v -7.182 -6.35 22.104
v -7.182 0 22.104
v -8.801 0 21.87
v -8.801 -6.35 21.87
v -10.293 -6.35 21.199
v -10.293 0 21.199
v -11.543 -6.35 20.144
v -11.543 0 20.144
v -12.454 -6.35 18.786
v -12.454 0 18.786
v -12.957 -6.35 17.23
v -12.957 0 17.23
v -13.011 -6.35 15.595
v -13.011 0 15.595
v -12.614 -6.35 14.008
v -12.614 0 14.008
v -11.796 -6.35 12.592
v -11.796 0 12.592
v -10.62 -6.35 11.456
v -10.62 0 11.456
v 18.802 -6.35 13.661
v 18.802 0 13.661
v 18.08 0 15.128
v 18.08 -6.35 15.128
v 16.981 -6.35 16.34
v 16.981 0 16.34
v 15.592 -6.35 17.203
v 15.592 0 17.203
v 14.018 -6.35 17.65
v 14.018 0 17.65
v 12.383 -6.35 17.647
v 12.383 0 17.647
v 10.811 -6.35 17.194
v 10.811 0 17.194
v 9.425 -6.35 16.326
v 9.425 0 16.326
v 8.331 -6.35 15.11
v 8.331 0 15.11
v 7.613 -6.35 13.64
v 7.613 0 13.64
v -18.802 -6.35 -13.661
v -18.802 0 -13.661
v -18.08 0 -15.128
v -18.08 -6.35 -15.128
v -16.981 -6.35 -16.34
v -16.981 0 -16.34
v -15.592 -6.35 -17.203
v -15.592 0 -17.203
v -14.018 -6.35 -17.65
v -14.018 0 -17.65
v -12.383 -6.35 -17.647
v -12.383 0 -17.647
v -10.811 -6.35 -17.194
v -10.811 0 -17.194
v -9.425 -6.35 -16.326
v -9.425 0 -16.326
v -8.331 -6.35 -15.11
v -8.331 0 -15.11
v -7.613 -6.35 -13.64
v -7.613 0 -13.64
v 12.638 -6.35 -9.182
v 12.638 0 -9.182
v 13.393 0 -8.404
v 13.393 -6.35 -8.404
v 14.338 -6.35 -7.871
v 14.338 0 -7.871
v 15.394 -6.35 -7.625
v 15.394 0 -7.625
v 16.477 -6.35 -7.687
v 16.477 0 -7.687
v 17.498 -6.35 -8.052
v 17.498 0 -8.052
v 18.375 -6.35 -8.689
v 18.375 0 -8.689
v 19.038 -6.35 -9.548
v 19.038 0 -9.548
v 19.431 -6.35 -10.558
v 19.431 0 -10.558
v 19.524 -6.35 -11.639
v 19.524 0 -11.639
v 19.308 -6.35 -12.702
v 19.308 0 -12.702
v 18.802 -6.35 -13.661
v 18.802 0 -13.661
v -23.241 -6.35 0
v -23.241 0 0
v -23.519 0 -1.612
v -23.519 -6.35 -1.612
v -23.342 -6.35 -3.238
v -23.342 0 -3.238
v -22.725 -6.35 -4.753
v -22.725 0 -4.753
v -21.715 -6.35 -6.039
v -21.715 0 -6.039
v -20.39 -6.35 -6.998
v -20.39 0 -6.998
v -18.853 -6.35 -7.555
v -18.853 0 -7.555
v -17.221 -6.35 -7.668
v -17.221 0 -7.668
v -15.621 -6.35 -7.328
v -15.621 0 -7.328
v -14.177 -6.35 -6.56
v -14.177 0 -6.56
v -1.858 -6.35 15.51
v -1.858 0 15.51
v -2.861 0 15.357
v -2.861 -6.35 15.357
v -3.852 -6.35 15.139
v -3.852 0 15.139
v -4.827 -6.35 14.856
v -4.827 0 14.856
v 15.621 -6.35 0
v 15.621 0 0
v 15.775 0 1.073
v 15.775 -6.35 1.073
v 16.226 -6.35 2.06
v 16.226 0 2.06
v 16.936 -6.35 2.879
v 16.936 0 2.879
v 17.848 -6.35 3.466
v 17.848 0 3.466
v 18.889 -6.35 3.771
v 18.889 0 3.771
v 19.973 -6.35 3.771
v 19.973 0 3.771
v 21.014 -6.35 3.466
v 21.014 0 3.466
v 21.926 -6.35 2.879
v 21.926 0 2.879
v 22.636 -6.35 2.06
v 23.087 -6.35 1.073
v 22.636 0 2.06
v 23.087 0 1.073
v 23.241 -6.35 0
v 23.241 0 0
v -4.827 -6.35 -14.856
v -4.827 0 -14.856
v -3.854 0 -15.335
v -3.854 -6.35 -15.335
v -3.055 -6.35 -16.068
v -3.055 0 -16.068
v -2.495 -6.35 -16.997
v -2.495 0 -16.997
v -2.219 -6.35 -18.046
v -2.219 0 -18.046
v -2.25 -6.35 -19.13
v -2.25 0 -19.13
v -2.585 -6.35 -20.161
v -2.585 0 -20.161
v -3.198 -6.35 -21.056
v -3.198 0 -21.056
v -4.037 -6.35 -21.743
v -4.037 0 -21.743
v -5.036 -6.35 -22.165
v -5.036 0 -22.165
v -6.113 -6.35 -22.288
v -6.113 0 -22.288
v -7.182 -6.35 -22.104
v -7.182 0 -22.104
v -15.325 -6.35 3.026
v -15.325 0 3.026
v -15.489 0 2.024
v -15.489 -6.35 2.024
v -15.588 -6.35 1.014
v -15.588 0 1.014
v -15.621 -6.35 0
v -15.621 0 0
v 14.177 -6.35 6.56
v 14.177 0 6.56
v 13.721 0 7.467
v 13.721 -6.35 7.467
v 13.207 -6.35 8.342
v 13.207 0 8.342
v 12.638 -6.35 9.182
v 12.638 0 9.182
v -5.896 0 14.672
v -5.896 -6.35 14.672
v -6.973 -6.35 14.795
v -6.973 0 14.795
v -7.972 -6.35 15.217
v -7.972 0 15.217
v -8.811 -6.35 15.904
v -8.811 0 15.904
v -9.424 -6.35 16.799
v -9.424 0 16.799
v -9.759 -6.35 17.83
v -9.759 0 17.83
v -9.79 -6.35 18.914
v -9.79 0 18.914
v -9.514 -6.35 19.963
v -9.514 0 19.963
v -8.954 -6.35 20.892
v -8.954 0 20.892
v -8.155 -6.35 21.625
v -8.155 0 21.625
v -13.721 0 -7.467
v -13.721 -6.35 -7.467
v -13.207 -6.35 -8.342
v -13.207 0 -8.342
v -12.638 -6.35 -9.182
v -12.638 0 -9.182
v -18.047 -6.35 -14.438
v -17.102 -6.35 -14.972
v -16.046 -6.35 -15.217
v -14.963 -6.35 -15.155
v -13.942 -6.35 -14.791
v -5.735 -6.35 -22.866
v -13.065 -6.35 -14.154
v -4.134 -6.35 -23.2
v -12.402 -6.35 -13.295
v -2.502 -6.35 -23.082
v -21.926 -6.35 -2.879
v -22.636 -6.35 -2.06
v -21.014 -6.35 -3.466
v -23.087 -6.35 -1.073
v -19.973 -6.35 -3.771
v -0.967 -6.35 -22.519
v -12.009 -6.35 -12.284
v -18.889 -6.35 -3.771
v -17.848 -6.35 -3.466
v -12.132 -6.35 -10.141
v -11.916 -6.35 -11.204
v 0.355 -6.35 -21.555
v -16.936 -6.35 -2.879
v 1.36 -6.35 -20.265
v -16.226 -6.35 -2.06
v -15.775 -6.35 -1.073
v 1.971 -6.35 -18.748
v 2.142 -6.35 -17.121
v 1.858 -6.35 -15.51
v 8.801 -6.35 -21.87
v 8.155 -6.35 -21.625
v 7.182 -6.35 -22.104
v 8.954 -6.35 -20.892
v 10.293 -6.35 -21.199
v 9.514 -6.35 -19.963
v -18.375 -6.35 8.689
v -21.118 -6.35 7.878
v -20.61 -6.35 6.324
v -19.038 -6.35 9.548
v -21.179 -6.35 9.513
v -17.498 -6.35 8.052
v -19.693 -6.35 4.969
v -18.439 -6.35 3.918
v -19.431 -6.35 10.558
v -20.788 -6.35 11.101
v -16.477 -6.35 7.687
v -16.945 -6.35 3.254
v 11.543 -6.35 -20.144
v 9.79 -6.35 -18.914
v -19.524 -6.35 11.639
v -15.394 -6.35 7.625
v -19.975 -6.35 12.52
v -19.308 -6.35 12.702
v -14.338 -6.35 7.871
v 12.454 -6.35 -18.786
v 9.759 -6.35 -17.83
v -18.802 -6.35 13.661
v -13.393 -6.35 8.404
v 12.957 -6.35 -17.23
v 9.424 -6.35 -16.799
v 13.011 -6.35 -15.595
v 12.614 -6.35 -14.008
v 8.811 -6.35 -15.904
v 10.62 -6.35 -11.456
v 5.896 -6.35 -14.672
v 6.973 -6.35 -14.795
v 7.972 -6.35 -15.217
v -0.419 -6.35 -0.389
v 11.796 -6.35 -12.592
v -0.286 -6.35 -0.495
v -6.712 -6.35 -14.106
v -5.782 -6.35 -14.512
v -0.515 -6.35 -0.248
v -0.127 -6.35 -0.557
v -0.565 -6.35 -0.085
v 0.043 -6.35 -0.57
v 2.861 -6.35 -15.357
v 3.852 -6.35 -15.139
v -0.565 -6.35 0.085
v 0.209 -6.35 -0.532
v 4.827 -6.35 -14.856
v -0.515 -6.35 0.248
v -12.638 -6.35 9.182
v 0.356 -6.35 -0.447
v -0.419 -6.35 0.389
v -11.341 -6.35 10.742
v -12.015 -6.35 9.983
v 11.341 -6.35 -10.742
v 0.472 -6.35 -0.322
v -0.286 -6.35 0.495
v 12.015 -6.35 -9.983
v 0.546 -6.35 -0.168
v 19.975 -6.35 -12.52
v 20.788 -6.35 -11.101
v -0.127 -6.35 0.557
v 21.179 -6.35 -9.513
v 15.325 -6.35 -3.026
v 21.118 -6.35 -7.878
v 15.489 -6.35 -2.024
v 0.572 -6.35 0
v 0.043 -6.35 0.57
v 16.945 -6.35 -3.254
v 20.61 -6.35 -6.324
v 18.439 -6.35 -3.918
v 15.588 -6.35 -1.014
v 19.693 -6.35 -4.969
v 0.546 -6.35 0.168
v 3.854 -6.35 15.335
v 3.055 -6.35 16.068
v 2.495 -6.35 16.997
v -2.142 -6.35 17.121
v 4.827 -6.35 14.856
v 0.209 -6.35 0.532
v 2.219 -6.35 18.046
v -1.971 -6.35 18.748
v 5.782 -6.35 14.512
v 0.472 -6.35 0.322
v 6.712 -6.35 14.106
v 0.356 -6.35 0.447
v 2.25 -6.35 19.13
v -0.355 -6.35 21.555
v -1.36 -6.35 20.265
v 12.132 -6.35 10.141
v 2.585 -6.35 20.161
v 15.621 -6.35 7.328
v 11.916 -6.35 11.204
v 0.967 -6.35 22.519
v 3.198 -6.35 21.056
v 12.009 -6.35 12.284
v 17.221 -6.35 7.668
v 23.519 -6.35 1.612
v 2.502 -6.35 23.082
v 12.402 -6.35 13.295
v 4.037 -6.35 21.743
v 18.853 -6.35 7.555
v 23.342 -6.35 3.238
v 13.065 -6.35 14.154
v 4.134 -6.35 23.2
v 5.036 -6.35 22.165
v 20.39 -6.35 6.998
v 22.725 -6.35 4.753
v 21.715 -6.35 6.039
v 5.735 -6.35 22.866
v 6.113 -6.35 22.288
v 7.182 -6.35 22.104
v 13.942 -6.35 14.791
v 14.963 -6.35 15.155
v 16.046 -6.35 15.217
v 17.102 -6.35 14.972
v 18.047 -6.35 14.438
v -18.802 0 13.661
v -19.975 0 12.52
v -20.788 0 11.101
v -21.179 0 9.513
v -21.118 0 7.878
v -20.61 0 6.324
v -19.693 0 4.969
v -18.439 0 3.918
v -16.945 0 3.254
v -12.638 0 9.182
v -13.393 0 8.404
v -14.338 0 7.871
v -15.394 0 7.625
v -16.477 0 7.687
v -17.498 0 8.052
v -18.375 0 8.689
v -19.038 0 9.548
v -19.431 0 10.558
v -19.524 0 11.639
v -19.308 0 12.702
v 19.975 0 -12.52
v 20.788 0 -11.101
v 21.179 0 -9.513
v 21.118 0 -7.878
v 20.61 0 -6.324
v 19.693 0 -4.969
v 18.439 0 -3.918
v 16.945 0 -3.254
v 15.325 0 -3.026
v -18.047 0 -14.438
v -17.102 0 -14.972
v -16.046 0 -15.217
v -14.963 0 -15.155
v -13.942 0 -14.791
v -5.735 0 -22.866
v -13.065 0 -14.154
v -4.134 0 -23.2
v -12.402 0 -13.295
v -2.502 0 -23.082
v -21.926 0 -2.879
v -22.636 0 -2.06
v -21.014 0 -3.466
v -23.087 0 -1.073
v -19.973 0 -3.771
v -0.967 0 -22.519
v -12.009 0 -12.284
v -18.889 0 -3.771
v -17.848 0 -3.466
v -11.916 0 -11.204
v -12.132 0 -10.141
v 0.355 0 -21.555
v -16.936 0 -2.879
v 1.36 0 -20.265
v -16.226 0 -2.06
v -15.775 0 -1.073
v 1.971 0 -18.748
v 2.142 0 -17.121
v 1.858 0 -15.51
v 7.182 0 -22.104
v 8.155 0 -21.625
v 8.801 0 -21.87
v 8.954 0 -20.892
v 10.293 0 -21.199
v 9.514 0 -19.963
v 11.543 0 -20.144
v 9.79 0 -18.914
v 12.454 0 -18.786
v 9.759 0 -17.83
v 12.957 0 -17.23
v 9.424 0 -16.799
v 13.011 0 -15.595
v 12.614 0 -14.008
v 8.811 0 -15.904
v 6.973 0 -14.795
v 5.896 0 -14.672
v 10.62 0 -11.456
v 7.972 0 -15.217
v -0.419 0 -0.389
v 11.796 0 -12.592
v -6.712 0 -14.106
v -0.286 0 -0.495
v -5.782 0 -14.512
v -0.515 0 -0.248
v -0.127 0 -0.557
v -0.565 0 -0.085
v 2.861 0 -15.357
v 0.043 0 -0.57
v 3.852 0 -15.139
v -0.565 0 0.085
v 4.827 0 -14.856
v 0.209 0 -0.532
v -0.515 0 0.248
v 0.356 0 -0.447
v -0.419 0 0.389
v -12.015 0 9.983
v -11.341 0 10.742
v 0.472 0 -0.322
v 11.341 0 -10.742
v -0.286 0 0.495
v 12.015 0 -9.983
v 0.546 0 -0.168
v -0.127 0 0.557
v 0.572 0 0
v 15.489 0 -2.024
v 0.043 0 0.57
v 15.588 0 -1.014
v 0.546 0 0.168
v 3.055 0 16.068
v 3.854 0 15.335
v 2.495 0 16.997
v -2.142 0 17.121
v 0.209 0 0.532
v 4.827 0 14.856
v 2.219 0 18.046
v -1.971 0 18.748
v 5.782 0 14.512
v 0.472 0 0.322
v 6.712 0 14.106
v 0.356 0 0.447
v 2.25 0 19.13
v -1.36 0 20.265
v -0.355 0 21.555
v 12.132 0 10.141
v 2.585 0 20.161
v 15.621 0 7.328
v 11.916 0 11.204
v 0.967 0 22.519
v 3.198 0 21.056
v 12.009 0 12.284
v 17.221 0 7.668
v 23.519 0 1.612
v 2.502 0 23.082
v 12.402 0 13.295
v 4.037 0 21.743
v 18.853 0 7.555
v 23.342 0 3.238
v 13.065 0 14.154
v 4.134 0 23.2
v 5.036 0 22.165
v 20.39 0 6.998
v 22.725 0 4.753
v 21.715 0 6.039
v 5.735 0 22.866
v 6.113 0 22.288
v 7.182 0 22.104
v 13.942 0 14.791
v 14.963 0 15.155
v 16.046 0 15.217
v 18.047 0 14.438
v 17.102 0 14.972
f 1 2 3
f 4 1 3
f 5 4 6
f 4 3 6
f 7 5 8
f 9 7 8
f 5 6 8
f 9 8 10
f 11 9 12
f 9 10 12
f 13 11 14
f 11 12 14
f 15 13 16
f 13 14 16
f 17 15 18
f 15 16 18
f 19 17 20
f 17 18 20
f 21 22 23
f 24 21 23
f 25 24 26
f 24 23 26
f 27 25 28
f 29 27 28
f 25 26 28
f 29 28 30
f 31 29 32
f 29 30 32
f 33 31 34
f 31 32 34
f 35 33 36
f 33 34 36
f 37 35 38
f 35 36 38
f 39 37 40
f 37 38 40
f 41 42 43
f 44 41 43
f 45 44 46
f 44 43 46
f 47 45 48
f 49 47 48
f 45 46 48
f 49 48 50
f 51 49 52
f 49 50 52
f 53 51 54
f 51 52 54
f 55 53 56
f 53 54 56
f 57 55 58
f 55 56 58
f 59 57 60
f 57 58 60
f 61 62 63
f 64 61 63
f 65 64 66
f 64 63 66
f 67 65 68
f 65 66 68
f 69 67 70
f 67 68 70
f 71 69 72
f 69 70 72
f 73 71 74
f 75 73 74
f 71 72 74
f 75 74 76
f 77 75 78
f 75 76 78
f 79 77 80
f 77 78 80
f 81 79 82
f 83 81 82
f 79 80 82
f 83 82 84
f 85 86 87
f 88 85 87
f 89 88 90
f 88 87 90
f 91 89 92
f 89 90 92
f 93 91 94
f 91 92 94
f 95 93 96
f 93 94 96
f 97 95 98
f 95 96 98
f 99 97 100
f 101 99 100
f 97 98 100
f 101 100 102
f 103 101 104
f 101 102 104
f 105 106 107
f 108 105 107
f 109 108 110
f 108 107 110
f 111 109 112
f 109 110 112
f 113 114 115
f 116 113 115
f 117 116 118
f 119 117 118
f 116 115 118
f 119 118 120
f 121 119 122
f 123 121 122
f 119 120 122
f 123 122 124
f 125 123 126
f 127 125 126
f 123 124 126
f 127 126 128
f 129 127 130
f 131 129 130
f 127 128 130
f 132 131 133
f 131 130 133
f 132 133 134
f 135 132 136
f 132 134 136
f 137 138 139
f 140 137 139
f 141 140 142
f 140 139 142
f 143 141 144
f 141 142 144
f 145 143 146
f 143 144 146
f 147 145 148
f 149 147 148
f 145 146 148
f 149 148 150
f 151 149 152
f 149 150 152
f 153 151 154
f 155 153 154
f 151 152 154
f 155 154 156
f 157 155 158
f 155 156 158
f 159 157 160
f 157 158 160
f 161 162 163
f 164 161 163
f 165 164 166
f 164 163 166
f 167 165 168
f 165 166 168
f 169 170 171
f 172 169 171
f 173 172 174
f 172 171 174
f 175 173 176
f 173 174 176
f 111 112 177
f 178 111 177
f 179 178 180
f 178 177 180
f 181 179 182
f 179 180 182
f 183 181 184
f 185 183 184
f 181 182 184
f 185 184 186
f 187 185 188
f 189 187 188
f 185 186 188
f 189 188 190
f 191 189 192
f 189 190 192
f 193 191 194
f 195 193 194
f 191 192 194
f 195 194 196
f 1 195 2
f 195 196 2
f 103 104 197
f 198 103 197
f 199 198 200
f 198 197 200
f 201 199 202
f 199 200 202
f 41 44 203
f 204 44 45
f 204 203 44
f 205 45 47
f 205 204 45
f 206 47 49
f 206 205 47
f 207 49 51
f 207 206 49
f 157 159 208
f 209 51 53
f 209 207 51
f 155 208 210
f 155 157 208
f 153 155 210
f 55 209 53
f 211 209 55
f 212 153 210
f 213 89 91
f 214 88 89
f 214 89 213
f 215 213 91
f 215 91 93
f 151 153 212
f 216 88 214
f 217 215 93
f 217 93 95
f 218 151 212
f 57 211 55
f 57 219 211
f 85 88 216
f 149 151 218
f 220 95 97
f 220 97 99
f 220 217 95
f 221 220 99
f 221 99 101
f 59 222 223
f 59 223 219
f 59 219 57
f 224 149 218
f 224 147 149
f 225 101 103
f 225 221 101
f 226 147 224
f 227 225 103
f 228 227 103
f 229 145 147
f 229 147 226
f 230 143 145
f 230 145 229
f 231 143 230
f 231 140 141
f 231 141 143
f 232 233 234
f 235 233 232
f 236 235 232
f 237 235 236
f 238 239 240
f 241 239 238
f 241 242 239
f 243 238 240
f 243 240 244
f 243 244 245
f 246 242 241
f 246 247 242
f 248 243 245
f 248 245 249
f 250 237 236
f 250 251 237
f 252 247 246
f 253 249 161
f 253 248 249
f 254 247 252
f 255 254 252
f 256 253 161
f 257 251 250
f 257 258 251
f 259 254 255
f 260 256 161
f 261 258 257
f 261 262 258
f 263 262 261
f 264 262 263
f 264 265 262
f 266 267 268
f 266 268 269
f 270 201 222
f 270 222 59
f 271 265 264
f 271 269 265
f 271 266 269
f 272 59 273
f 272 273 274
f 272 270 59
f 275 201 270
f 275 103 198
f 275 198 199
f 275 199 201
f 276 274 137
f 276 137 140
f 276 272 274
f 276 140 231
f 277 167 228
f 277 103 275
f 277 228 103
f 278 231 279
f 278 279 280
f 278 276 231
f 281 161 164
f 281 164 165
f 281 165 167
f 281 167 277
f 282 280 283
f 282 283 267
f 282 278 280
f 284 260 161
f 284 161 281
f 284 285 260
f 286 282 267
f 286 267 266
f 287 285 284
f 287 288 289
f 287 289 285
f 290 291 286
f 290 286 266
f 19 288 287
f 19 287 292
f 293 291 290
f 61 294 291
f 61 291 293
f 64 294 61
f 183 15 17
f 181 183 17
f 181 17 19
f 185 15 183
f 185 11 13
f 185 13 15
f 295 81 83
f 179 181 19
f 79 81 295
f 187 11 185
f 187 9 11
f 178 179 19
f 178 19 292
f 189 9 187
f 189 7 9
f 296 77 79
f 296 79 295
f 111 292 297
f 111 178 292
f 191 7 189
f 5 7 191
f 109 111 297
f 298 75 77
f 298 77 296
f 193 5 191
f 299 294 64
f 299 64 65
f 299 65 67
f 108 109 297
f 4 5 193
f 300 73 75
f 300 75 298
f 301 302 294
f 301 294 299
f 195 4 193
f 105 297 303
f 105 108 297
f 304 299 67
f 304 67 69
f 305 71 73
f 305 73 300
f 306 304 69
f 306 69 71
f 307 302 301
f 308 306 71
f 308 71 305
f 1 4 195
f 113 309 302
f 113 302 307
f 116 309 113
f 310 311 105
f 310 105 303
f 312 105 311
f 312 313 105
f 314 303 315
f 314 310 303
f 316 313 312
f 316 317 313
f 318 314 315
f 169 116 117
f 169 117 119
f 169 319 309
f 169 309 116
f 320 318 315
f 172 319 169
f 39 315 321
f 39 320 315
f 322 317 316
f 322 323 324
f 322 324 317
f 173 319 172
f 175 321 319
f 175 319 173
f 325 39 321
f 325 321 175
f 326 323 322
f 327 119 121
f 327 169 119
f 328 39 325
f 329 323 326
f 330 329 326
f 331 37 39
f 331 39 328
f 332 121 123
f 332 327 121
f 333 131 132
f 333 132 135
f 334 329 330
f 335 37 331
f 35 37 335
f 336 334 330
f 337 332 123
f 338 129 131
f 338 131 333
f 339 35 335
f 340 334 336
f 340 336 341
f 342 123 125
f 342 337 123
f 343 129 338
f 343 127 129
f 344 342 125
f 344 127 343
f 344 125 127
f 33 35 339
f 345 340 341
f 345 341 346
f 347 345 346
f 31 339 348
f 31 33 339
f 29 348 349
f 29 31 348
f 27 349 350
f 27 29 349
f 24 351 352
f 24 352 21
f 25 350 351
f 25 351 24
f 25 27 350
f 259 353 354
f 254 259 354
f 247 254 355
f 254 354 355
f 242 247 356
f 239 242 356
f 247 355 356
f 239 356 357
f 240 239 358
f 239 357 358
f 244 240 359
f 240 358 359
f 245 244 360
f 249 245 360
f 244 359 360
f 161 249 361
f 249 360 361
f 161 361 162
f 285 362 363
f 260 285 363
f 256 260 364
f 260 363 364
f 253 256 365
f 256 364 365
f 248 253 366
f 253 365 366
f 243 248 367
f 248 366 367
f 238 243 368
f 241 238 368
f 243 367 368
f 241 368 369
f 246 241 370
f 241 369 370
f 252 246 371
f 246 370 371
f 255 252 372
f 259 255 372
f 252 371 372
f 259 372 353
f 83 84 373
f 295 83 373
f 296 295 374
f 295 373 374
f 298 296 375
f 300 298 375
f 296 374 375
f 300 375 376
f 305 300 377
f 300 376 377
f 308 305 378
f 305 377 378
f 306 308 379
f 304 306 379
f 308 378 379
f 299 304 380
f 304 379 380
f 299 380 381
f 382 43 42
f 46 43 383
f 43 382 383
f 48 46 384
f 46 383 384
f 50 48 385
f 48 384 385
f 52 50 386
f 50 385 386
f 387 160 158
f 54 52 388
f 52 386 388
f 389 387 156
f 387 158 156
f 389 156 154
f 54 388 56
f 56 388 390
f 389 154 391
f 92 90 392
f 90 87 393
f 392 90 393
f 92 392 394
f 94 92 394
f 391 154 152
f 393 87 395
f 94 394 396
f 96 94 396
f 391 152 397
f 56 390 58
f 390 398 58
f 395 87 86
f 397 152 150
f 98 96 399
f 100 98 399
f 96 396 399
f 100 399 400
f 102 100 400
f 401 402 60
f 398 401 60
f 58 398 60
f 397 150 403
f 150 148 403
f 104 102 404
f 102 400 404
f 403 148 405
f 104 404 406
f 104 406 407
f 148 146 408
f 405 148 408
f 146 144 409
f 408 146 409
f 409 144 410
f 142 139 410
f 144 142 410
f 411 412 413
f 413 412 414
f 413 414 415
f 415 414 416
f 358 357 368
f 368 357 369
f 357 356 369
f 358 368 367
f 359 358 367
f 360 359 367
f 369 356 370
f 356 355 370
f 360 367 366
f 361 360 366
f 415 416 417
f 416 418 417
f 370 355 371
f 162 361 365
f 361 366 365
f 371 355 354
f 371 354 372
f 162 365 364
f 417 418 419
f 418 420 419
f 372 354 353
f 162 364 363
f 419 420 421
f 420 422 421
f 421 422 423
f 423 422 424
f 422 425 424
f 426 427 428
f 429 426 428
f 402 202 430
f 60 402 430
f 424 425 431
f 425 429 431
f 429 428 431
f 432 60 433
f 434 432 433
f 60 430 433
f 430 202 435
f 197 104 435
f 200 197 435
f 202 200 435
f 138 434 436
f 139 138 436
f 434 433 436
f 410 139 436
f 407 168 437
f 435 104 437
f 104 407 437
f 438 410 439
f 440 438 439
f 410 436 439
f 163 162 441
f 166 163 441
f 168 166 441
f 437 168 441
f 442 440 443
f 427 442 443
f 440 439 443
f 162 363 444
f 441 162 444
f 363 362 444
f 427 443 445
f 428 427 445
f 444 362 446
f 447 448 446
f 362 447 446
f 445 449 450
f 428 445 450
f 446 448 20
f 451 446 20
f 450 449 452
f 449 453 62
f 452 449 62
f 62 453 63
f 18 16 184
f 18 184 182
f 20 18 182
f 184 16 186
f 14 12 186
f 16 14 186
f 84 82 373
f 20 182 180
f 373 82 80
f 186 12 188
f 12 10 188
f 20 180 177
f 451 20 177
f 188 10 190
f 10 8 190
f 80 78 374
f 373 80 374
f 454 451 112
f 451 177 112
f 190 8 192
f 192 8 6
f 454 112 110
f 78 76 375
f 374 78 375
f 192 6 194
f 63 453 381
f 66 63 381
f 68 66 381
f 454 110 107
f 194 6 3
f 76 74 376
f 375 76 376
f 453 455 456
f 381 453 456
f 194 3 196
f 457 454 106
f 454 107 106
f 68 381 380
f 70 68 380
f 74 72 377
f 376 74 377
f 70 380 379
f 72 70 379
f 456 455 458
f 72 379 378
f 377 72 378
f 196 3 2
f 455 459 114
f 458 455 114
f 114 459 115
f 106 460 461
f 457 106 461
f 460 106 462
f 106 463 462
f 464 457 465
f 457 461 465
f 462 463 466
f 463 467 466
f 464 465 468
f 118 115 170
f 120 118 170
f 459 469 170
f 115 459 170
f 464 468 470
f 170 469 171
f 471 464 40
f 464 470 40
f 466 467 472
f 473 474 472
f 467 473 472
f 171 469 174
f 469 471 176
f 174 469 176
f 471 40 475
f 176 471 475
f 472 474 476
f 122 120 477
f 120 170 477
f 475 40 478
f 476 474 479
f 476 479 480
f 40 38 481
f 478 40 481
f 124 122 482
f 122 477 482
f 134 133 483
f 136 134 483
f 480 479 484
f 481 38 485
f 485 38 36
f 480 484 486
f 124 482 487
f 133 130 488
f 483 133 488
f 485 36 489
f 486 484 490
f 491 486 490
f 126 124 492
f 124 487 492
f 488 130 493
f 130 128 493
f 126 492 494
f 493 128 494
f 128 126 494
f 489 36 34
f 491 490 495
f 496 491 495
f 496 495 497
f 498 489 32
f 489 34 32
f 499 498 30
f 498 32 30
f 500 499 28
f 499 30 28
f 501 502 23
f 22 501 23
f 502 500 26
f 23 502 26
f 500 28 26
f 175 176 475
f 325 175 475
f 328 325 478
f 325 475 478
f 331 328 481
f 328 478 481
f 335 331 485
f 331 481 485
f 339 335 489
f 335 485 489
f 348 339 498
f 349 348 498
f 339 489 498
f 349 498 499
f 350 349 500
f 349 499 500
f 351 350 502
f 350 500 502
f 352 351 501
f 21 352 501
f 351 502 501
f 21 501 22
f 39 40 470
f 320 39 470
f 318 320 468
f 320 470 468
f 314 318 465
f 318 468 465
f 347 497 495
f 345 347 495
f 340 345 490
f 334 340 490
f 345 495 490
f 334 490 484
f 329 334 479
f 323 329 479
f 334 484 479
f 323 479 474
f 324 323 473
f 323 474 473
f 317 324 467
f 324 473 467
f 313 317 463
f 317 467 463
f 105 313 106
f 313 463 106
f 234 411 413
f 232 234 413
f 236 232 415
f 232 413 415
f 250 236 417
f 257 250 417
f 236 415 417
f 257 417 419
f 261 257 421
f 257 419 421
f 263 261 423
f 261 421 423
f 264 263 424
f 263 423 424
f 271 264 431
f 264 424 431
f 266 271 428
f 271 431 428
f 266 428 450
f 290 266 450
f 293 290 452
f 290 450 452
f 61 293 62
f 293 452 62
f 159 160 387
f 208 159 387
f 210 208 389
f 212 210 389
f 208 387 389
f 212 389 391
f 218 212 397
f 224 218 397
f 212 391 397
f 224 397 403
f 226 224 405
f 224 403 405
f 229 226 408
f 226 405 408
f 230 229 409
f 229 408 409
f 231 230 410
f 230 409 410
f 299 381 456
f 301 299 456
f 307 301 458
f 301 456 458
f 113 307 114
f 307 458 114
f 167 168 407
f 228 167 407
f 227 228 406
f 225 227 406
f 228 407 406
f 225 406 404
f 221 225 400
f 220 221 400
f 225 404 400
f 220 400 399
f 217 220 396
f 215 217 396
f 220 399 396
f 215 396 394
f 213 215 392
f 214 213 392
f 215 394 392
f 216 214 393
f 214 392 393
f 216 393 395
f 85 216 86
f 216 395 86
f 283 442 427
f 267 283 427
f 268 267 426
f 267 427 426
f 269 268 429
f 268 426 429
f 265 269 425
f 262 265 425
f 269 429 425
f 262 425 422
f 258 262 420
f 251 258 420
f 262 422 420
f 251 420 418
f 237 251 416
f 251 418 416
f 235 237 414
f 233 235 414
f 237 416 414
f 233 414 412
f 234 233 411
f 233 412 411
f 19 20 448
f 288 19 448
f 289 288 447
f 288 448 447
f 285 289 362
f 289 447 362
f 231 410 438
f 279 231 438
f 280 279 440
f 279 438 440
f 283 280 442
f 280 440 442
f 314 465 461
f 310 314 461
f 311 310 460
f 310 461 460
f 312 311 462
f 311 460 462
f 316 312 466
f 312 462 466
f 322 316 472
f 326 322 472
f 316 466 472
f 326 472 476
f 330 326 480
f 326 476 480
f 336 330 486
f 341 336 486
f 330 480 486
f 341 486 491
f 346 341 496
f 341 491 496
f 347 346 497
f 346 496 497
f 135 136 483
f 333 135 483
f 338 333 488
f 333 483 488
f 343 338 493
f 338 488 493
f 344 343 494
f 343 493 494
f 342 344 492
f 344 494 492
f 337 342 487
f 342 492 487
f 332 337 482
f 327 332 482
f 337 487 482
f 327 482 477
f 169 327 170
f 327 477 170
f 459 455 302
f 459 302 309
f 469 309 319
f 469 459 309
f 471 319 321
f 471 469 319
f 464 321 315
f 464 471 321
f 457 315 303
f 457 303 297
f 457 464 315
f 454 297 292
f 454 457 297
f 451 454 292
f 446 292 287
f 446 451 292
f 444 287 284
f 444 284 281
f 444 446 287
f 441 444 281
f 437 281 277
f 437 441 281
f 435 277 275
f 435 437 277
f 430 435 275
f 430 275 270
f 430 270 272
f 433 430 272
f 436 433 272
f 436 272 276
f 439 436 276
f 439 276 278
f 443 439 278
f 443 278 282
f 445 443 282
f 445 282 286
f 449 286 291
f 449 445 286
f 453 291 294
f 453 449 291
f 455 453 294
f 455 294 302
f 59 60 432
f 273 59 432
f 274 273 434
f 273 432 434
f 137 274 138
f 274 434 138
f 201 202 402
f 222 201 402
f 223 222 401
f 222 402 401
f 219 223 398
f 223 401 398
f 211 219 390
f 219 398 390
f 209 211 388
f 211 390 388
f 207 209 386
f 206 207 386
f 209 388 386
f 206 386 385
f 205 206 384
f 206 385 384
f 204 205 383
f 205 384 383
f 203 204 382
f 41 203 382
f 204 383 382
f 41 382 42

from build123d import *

# Parameters (mm, degrees)
F0_R     = 0.5715
F1_DEPTH = 6.35


with BuildPart() as f1:
    # F0 (on Front) → F1 (new body)
    with BuildSketch(Plane.XZ):
        with BuildLine():
            ThreePointArc((23.241, 0), (21.086285, 6.564897), (14.176824, 6.559977))
            ThreePointArc((14.176824, 6.559977), (13.471175, 7.908419), (12.637654, 9.181793))
            ThreePointArc((12.637654, 9.181793), (13.480547, 14.50361), (18.802364, 13.660717))
            ThreePointArc((18.802364, 13.660717), (13.200413, 17.70532), (7.613434, 13.640061))
            ThreePointArc((7.613434, 13.640061), (6.249957, 14.316203), (4.827154, 14.856454))
            ThreePointArc((4.827154, 14.856454), (2.380984, 19.657334), (7.181864, 22.103504))
            ThreePointArc((7.181864, 22.103504), (0.272432, 22.082913), (-1.858029, 15.510105))
            ThreePointArc((-1.858029, 15.510105), (-3.358532, 15.255684), (-4.827154, 14.856454))
            ThreePointArc((-4.827154, 14.856454), (-9.628035, 17.302624), (-7.181864, 22.103504))
            ThreePointArc((-7.181864, 22.103504), (-12.759608, 18.025584), (-10.619788, 11.455817))
            ThreePointArc((-10.619788, 11.455817), (-11.684175, 10.368013), (-12.637654, 9.181793))
            ThreePointArc((-12.637654, 9.181793), (-17.959471, 8.3389), (-18.802364, 13.660717))
            ThreePointArc((-18.802364, 13.660717), (-20.917912, 7.083094), (-15.325149, 3.025796))
            ThreePointArc((-15.325149, 3.025796), (-15.546861, 1.520112), (-15.621, 0))
            ThreePointArc((-15.621, 0), (-19.431, -3.81), (-23.241, 0))
            ThreePointArc((-23.241, 0), (-21.086285, -6.564897), (-14.176824, -6.559977))
            ThreePointArc((-14.176824, -6.559977), (-13.471175, -7.908419), (-12.637654, -9.181793))
            ThreePointArc((-12.637654, -9.181793), (-13.480547, -14.50361), (-18.802364, -13.660717))
            ThreePointArc((-18.802364, -13.660717), (-13.200413, -17.70532), (-7.613434, -13.640061))
            ThreePointArc((-7.613434, -13.640061), (-6.249957, -14.316203), (-4.827154, -14.856454))
            ThreePointArc((-4.827154, -14.856454), (-2.380984, -19.657334), (-7.181864, -22.103504))
            ThreePointArc((-7.181864, -22.103504), (-0.272432, -22.082913), (1.858029, -15.510105))
            ThreePointArc((1.858029, -15.510105), (3.358532, -15.255684), (4.827154, -14.856454))
            ThreePointArc((4.827154, -14.856454), (9.628035, -17.302624), (7.181864, -22.103504))
            ThreePointArc((7.181864, -22.103504), (12.759608, -18.025584), (10.619788, -11.455817))
            ThreePointArc((10.619788, -11.455817), (11.684175, -10.368013), (12.637654, -9.181793))
            ThreePointArc((12.637654, -9.181793), (17.959471, -8.3389), (18.802364, -13.660717))
            ThreePointArc((18.802364, -13.660717), (20.917912, -7.083094), (15.325149, -3.025796))
            ThreePointArc((15.325149, -3.025796), (15.546861, -1.520112), (15.621, 0))
            ThreePointArc((15.621, 0), (19.431, 3.81), (23.241, 0))
        make_face()
        Circle(F0_R, mode=Mode.SUBTRACT)
    extrude(amount=F1_DEPTH)


solid = f1.part
